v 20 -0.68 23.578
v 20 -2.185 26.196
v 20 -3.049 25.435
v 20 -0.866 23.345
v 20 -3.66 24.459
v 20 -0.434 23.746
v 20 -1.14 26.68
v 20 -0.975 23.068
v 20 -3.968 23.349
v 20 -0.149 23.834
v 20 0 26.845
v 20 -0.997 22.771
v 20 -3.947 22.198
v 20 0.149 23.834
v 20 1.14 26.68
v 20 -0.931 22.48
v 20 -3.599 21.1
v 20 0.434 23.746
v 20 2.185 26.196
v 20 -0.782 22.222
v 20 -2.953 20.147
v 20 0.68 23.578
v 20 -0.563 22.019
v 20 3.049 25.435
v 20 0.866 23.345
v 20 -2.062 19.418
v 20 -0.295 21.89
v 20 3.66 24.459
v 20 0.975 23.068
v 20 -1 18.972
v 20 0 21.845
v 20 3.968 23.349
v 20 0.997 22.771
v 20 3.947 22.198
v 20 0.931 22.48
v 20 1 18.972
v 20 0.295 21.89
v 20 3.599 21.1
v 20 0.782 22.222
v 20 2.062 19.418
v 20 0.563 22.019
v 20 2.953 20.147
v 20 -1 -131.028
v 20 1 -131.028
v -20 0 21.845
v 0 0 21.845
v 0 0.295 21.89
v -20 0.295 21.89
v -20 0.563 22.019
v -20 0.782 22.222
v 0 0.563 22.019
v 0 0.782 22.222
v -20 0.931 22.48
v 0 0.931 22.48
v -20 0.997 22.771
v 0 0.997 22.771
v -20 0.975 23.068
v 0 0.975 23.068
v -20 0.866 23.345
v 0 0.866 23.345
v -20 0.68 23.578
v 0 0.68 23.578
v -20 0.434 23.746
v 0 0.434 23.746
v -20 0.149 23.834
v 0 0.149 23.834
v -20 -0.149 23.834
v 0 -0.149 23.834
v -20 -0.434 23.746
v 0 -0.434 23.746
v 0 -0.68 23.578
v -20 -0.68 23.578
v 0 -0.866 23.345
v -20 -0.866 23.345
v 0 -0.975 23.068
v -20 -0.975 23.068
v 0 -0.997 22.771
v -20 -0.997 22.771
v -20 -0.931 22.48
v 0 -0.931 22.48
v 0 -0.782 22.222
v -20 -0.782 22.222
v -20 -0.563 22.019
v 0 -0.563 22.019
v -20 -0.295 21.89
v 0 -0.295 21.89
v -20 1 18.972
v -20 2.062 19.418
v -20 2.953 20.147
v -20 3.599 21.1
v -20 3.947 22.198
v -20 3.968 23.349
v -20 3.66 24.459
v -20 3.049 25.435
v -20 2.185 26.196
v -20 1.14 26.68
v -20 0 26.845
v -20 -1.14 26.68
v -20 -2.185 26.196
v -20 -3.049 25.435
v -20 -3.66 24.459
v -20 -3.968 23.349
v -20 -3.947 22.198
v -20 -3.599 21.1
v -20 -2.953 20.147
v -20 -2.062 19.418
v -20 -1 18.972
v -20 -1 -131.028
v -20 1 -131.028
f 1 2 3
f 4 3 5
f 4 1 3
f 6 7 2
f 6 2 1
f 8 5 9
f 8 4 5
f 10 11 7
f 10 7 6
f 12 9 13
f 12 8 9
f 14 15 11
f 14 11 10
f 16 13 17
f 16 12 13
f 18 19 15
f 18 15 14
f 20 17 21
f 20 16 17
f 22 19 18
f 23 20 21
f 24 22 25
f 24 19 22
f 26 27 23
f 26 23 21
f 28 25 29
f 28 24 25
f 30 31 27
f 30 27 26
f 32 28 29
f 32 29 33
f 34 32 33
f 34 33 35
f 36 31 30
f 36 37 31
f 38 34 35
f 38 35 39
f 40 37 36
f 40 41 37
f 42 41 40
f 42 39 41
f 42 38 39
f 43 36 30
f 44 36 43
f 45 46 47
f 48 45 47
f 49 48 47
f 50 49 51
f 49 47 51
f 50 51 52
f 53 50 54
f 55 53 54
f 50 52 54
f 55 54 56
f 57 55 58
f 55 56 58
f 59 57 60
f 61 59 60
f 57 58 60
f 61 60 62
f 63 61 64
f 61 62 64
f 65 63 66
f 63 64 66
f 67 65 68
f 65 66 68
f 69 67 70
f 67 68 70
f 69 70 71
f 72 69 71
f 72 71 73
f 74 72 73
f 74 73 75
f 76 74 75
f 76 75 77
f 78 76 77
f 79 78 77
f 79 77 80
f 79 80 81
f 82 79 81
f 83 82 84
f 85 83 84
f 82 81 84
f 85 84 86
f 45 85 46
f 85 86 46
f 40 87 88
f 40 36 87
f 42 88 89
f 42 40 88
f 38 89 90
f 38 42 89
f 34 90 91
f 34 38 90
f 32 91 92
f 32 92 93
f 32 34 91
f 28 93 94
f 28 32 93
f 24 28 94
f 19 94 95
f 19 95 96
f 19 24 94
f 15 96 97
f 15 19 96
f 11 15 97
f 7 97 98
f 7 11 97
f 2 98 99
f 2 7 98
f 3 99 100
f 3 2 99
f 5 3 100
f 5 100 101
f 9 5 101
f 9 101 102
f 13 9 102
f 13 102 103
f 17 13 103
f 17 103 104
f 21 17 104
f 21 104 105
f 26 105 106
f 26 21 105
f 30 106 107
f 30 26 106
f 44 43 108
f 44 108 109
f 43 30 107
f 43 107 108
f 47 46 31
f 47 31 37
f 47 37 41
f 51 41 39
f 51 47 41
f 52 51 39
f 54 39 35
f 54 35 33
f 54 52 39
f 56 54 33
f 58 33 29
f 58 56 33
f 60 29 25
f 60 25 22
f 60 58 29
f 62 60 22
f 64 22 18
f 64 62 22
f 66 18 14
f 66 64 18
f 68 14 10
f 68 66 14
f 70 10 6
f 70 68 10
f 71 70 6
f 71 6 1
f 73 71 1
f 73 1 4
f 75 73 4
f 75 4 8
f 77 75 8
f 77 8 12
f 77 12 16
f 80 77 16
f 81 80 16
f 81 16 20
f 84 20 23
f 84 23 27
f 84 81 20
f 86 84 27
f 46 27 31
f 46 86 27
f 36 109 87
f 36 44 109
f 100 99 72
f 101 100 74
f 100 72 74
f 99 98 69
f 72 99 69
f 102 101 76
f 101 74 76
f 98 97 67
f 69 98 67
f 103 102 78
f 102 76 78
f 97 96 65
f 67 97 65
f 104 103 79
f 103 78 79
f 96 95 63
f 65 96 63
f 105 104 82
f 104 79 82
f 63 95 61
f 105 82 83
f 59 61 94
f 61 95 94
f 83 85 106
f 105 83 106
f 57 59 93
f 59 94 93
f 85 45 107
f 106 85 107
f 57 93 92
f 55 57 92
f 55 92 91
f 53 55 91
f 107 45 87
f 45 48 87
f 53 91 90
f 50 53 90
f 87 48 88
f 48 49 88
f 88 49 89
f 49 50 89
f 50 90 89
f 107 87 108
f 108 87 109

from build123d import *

# Parameters (mm, degrees)
SKETCH1_R                = 4
SKETCH1_R_2              = 1
BOSS_EXTRUDE1_DEPTH      = 20
BOSS_EXTRUDE1_DEPTH_BACK = 20


with BuildPart() as part:
    # Sketch1 → Boss-Extrude1 (new body, two sides)
    with BuildSketch(Plane(origin=(0, 0, 0), x_dir=(0, 0, -1), z_dir=(1, 0, 0))) as boss_extrude1_sk:
        with Locations((-22.845337752, 0)):
            Circle(SKETCH1_R)
        with Locations((-22.845337752, 0)):
            Circle(SKETCH1_R_2, mode=Mode.SUBTRACT)
        with BuildLine():
            Line((131.027645594, 1), (-18.972354406, 1))
            ThreePointArc((-18.972354406, 1), (-18.877218967, 0.50401717), (-18.845337752, 0))
            ThreePointArc((-18.845337752, 0), (-18.877218967, -0.50401717), (-18.972354406, -1))
            Line((-18.972354406, -1), (131.027645594, -1))
            Line((131.027645594, -1), (131.027645594, 1))
        make_face()
    extrude(amount=BOSS_EXTRUDE1_DEPTH)
    extrude(boss_extrude1_sk.sketch, amount=-BOSS_EXTRUDE1_DEPTH_BACK)


solid = part.part
